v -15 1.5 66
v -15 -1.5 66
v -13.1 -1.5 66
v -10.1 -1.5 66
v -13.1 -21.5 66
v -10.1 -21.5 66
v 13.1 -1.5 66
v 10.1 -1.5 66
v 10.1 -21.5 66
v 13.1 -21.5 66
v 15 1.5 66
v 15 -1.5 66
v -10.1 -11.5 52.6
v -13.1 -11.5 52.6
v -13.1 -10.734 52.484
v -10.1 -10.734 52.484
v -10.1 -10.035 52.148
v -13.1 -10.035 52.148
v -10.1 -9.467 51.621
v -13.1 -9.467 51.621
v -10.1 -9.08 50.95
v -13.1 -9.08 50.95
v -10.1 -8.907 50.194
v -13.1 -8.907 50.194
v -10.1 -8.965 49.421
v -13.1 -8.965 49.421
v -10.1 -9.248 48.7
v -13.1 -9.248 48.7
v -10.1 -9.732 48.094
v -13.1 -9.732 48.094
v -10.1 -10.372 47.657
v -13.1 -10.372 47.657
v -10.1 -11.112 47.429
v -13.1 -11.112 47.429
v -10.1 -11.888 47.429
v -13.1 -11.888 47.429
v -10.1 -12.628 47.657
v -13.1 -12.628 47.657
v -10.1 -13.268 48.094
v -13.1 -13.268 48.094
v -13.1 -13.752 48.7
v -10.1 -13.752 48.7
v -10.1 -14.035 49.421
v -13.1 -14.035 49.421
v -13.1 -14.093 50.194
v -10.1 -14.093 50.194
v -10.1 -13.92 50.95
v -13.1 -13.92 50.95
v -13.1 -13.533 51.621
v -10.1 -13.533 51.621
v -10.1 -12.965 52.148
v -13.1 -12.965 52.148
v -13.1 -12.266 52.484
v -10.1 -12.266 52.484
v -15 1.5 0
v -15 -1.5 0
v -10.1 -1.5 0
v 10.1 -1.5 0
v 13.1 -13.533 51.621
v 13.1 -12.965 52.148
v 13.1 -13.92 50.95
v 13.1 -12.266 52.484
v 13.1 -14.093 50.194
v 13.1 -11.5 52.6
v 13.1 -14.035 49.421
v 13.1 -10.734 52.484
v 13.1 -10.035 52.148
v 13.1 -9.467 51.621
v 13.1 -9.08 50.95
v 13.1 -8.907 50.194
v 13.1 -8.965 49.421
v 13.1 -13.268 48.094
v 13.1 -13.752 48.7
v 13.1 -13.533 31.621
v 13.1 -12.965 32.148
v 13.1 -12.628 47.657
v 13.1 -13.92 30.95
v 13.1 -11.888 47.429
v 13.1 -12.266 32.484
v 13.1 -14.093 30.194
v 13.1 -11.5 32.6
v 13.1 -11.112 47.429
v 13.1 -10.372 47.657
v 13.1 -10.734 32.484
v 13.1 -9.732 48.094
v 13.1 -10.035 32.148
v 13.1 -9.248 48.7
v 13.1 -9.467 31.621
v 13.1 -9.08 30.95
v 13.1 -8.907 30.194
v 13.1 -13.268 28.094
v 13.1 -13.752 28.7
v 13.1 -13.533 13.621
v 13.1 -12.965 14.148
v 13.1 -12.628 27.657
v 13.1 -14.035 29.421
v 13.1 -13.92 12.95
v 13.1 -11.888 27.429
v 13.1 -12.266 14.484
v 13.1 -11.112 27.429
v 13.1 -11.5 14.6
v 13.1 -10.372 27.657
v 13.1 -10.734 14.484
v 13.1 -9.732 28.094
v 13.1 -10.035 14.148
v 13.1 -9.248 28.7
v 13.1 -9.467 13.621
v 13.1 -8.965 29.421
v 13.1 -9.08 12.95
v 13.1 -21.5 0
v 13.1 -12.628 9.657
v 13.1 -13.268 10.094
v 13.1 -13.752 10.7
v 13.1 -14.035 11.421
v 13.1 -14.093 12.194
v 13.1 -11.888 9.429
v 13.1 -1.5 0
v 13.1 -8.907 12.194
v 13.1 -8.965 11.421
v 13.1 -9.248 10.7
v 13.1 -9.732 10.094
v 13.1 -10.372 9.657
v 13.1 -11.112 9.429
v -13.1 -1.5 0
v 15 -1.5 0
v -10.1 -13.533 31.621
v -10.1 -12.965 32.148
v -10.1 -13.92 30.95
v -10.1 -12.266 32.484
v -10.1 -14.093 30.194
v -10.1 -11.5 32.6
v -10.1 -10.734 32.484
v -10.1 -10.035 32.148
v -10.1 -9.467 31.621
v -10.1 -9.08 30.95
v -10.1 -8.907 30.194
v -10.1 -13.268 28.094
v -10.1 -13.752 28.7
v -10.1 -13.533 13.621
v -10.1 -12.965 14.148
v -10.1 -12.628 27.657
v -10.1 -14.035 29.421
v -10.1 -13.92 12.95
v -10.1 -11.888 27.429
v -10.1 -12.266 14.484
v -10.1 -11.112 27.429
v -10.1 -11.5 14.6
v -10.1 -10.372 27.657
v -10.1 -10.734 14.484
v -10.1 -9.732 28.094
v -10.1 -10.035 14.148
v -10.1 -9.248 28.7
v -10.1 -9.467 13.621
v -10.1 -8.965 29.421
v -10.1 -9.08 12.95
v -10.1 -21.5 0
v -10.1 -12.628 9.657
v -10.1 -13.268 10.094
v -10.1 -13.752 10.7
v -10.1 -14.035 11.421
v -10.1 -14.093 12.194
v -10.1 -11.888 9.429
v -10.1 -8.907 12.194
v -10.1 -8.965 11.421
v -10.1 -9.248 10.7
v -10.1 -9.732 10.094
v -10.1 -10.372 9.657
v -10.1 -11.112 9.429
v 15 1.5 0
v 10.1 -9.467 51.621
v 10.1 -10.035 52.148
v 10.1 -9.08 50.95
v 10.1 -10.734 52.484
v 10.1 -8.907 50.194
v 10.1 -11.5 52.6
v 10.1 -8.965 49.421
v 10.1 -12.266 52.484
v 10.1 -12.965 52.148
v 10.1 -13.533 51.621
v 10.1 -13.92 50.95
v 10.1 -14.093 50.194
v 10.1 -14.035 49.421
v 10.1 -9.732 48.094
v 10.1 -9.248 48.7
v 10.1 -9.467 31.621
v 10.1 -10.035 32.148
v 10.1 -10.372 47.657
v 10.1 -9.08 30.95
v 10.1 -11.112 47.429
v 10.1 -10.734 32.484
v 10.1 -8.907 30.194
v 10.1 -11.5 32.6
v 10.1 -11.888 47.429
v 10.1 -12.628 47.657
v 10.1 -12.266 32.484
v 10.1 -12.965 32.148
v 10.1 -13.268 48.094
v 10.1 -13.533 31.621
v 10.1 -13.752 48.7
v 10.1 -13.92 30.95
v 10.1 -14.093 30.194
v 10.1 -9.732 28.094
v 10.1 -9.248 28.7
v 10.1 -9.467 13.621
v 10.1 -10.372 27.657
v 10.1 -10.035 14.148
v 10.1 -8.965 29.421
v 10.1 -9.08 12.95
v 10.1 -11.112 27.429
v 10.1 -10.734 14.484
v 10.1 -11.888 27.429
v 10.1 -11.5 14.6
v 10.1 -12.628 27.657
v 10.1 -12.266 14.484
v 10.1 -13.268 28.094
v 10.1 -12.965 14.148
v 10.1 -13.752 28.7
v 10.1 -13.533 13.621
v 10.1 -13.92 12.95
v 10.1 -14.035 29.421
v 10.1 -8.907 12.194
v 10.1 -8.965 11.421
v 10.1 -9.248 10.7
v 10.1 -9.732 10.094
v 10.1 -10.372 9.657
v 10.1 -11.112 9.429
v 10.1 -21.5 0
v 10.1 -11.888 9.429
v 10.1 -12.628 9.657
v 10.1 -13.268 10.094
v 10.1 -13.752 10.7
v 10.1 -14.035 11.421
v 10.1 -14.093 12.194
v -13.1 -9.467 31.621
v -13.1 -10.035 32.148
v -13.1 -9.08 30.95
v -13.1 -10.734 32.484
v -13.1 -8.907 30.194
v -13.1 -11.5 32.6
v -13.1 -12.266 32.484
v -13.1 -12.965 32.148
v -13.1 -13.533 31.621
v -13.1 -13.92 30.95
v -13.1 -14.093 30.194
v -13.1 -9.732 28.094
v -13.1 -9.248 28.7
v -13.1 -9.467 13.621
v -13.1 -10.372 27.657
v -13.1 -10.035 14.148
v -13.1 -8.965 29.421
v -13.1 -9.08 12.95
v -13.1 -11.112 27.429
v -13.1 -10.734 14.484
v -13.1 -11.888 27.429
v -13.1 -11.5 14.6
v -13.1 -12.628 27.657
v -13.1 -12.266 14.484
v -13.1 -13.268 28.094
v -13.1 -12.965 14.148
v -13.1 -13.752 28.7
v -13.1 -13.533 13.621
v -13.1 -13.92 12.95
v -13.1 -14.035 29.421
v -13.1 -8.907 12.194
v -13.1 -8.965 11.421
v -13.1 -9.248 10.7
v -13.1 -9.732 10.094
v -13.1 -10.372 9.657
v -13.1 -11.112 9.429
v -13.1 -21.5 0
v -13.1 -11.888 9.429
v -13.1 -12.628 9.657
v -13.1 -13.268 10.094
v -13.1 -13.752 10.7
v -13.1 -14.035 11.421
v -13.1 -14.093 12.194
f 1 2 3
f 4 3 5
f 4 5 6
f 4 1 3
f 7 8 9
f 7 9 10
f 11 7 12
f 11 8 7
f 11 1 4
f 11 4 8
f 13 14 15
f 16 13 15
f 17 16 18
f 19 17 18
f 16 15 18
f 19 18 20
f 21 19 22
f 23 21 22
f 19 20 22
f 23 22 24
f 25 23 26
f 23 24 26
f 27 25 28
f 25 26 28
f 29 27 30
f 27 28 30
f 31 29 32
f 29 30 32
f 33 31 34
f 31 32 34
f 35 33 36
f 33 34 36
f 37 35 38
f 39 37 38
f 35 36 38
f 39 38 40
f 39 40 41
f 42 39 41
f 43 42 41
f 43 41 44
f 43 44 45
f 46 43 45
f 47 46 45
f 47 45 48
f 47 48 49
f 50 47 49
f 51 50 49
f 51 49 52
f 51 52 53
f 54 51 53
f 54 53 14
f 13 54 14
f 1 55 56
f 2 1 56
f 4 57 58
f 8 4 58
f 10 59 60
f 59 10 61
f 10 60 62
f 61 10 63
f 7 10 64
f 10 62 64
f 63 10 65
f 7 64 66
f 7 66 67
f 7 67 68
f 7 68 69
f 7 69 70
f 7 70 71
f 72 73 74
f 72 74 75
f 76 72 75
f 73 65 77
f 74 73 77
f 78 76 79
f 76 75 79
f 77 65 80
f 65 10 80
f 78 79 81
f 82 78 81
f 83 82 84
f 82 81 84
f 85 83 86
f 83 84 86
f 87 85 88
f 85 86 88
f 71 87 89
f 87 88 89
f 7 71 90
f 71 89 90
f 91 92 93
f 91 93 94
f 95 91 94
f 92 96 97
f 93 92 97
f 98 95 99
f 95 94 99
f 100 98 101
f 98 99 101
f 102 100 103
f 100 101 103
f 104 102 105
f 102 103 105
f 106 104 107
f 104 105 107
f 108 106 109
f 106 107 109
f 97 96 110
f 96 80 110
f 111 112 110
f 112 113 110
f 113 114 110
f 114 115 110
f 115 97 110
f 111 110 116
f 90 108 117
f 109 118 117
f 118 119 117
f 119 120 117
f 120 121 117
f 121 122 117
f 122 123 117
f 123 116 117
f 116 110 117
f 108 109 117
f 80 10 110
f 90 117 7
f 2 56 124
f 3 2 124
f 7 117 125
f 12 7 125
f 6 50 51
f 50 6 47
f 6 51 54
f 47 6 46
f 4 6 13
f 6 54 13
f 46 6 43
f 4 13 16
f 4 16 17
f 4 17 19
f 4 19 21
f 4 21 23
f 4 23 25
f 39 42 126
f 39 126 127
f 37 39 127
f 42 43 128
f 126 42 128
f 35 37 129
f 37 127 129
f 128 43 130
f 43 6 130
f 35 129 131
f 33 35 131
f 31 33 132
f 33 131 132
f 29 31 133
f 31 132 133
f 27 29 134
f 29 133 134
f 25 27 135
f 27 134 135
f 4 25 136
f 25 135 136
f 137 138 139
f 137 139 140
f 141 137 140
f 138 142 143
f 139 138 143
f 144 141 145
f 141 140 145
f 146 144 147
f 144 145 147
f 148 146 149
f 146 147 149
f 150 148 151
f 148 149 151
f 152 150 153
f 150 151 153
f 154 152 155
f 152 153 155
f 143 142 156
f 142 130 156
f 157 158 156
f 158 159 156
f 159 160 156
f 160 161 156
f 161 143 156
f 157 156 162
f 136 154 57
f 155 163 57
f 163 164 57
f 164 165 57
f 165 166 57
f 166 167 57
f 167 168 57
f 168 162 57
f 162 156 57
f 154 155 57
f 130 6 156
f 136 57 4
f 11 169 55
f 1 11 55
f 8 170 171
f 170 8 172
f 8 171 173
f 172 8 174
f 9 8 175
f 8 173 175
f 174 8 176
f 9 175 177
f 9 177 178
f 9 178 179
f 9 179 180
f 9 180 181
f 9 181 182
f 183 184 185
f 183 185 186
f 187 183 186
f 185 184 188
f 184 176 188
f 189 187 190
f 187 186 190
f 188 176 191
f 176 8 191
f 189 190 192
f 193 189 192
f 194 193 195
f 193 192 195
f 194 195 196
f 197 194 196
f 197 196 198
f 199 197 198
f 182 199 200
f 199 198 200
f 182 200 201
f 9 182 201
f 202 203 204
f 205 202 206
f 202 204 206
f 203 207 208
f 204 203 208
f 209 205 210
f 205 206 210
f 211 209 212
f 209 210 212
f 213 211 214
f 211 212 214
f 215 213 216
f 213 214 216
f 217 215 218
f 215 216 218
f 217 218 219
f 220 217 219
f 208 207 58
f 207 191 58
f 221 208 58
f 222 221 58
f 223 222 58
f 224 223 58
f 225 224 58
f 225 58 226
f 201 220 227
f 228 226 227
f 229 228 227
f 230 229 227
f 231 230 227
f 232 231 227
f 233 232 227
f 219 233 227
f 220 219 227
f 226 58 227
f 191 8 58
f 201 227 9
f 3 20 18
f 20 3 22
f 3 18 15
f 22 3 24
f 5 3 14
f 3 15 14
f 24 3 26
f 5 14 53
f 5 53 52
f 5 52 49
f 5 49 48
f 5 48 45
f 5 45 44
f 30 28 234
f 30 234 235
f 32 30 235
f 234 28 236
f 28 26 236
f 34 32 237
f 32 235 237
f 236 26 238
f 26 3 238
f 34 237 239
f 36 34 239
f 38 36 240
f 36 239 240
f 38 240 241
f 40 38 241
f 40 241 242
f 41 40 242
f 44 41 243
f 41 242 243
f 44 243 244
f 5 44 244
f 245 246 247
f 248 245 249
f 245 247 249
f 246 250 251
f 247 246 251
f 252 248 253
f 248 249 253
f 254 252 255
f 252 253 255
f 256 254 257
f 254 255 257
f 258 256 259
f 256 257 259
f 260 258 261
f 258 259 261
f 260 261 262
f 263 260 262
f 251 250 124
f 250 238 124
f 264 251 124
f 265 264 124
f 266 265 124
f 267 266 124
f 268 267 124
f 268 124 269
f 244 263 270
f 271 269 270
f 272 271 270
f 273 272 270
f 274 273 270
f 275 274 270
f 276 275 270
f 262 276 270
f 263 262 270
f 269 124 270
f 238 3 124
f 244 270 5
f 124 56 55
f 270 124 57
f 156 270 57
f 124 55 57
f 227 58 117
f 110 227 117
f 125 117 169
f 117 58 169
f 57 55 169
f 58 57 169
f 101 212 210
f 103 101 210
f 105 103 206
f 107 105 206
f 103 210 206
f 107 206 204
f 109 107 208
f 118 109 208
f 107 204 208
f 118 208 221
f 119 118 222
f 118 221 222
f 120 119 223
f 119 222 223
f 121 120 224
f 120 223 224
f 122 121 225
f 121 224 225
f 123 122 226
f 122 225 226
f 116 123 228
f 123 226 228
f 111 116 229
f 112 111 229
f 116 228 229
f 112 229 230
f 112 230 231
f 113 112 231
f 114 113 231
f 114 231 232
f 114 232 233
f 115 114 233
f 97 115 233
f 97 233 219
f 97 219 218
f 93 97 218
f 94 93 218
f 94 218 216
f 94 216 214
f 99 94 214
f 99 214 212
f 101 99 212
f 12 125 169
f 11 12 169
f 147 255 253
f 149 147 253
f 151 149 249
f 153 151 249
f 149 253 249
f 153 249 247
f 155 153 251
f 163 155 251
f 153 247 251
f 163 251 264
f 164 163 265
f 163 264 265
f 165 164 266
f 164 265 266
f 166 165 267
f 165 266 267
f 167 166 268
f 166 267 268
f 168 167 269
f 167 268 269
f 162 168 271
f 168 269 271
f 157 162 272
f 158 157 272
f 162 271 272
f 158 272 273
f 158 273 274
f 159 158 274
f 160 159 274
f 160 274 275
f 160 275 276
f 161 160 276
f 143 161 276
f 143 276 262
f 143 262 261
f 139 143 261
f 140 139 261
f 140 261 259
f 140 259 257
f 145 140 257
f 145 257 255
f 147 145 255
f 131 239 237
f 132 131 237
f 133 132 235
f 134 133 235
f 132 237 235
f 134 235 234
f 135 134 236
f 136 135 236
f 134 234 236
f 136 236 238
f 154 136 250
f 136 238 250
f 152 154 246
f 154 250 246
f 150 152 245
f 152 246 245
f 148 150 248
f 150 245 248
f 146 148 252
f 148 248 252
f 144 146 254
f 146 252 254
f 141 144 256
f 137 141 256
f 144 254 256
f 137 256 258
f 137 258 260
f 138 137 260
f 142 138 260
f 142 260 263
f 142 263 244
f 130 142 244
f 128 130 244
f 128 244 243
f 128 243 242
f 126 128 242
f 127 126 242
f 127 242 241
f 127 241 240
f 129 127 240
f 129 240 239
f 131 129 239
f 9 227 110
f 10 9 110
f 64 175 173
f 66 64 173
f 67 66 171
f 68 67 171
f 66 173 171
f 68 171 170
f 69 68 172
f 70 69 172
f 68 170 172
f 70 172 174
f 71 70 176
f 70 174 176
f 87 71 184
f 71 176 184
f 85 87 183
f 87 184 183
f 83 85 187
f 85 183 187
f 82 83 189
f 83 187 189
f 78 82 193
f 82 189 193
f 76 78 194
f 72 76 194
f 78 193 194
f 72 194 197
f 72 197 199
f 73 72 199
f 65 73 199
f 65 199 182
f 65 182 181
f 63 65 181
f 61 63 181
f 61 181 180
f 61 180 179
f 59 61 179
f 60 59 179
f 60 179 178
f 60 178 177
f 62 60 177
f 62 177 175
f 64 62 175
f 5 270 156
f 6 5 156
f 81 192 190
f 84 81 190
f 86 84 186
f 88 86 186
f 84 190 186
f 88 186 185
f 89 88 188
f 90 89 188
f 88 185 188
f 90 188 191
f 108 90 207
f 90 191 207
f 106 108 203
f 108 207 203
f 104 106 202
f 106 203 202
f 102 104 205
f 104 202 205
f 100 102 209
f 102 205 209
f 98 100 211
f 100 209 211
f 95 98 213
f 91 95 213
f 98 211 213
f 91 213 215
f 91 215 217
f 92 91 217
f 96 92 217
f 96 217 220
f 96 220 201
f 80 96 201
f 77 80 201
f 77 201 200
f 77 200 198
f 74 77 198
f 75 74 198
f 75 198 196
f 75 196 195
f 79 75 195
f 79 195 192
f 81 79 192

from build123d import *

# Parameters (mm, degrees)
EXTRUDE_1_DEPTH     = 66
HOLE_WIZARD_1_D     = 5.2
HOLE_WIZARD_1_DEPTH = 100


with BuildPart() as part:
    # 草图1 → 凸台-拉伸1 (new body)
    with BuildSketch(Plane.XY):
        Polygon((-15, -1.5), (-13.1, -1.5), (-13.1, -21.5), (-10.1, -21.5), (-10.1, -1.5), (10.1, -1.5), (10.1, -21.5), (13.1, -21.5), (13.1, -1.5), (15, -1.5), (15, 1.5), (-15, 1.5), align=None)
    extrude(amount=EXTRUDE_1_DEPTH)

    # 孔1
    with Locations(Plane(origin=(13.1, 0, 0), x_dir=(0, 0, -1), z_dir=(1, 0, 0))):
        with Locations((-50, -11.5), (-30, -11.5), (-12, -11.5)):
            Hole(HOLE_WIZARD_1_D / 2, depth=HOLE_WIZARD_1_DEPTH)


solid = part.part
